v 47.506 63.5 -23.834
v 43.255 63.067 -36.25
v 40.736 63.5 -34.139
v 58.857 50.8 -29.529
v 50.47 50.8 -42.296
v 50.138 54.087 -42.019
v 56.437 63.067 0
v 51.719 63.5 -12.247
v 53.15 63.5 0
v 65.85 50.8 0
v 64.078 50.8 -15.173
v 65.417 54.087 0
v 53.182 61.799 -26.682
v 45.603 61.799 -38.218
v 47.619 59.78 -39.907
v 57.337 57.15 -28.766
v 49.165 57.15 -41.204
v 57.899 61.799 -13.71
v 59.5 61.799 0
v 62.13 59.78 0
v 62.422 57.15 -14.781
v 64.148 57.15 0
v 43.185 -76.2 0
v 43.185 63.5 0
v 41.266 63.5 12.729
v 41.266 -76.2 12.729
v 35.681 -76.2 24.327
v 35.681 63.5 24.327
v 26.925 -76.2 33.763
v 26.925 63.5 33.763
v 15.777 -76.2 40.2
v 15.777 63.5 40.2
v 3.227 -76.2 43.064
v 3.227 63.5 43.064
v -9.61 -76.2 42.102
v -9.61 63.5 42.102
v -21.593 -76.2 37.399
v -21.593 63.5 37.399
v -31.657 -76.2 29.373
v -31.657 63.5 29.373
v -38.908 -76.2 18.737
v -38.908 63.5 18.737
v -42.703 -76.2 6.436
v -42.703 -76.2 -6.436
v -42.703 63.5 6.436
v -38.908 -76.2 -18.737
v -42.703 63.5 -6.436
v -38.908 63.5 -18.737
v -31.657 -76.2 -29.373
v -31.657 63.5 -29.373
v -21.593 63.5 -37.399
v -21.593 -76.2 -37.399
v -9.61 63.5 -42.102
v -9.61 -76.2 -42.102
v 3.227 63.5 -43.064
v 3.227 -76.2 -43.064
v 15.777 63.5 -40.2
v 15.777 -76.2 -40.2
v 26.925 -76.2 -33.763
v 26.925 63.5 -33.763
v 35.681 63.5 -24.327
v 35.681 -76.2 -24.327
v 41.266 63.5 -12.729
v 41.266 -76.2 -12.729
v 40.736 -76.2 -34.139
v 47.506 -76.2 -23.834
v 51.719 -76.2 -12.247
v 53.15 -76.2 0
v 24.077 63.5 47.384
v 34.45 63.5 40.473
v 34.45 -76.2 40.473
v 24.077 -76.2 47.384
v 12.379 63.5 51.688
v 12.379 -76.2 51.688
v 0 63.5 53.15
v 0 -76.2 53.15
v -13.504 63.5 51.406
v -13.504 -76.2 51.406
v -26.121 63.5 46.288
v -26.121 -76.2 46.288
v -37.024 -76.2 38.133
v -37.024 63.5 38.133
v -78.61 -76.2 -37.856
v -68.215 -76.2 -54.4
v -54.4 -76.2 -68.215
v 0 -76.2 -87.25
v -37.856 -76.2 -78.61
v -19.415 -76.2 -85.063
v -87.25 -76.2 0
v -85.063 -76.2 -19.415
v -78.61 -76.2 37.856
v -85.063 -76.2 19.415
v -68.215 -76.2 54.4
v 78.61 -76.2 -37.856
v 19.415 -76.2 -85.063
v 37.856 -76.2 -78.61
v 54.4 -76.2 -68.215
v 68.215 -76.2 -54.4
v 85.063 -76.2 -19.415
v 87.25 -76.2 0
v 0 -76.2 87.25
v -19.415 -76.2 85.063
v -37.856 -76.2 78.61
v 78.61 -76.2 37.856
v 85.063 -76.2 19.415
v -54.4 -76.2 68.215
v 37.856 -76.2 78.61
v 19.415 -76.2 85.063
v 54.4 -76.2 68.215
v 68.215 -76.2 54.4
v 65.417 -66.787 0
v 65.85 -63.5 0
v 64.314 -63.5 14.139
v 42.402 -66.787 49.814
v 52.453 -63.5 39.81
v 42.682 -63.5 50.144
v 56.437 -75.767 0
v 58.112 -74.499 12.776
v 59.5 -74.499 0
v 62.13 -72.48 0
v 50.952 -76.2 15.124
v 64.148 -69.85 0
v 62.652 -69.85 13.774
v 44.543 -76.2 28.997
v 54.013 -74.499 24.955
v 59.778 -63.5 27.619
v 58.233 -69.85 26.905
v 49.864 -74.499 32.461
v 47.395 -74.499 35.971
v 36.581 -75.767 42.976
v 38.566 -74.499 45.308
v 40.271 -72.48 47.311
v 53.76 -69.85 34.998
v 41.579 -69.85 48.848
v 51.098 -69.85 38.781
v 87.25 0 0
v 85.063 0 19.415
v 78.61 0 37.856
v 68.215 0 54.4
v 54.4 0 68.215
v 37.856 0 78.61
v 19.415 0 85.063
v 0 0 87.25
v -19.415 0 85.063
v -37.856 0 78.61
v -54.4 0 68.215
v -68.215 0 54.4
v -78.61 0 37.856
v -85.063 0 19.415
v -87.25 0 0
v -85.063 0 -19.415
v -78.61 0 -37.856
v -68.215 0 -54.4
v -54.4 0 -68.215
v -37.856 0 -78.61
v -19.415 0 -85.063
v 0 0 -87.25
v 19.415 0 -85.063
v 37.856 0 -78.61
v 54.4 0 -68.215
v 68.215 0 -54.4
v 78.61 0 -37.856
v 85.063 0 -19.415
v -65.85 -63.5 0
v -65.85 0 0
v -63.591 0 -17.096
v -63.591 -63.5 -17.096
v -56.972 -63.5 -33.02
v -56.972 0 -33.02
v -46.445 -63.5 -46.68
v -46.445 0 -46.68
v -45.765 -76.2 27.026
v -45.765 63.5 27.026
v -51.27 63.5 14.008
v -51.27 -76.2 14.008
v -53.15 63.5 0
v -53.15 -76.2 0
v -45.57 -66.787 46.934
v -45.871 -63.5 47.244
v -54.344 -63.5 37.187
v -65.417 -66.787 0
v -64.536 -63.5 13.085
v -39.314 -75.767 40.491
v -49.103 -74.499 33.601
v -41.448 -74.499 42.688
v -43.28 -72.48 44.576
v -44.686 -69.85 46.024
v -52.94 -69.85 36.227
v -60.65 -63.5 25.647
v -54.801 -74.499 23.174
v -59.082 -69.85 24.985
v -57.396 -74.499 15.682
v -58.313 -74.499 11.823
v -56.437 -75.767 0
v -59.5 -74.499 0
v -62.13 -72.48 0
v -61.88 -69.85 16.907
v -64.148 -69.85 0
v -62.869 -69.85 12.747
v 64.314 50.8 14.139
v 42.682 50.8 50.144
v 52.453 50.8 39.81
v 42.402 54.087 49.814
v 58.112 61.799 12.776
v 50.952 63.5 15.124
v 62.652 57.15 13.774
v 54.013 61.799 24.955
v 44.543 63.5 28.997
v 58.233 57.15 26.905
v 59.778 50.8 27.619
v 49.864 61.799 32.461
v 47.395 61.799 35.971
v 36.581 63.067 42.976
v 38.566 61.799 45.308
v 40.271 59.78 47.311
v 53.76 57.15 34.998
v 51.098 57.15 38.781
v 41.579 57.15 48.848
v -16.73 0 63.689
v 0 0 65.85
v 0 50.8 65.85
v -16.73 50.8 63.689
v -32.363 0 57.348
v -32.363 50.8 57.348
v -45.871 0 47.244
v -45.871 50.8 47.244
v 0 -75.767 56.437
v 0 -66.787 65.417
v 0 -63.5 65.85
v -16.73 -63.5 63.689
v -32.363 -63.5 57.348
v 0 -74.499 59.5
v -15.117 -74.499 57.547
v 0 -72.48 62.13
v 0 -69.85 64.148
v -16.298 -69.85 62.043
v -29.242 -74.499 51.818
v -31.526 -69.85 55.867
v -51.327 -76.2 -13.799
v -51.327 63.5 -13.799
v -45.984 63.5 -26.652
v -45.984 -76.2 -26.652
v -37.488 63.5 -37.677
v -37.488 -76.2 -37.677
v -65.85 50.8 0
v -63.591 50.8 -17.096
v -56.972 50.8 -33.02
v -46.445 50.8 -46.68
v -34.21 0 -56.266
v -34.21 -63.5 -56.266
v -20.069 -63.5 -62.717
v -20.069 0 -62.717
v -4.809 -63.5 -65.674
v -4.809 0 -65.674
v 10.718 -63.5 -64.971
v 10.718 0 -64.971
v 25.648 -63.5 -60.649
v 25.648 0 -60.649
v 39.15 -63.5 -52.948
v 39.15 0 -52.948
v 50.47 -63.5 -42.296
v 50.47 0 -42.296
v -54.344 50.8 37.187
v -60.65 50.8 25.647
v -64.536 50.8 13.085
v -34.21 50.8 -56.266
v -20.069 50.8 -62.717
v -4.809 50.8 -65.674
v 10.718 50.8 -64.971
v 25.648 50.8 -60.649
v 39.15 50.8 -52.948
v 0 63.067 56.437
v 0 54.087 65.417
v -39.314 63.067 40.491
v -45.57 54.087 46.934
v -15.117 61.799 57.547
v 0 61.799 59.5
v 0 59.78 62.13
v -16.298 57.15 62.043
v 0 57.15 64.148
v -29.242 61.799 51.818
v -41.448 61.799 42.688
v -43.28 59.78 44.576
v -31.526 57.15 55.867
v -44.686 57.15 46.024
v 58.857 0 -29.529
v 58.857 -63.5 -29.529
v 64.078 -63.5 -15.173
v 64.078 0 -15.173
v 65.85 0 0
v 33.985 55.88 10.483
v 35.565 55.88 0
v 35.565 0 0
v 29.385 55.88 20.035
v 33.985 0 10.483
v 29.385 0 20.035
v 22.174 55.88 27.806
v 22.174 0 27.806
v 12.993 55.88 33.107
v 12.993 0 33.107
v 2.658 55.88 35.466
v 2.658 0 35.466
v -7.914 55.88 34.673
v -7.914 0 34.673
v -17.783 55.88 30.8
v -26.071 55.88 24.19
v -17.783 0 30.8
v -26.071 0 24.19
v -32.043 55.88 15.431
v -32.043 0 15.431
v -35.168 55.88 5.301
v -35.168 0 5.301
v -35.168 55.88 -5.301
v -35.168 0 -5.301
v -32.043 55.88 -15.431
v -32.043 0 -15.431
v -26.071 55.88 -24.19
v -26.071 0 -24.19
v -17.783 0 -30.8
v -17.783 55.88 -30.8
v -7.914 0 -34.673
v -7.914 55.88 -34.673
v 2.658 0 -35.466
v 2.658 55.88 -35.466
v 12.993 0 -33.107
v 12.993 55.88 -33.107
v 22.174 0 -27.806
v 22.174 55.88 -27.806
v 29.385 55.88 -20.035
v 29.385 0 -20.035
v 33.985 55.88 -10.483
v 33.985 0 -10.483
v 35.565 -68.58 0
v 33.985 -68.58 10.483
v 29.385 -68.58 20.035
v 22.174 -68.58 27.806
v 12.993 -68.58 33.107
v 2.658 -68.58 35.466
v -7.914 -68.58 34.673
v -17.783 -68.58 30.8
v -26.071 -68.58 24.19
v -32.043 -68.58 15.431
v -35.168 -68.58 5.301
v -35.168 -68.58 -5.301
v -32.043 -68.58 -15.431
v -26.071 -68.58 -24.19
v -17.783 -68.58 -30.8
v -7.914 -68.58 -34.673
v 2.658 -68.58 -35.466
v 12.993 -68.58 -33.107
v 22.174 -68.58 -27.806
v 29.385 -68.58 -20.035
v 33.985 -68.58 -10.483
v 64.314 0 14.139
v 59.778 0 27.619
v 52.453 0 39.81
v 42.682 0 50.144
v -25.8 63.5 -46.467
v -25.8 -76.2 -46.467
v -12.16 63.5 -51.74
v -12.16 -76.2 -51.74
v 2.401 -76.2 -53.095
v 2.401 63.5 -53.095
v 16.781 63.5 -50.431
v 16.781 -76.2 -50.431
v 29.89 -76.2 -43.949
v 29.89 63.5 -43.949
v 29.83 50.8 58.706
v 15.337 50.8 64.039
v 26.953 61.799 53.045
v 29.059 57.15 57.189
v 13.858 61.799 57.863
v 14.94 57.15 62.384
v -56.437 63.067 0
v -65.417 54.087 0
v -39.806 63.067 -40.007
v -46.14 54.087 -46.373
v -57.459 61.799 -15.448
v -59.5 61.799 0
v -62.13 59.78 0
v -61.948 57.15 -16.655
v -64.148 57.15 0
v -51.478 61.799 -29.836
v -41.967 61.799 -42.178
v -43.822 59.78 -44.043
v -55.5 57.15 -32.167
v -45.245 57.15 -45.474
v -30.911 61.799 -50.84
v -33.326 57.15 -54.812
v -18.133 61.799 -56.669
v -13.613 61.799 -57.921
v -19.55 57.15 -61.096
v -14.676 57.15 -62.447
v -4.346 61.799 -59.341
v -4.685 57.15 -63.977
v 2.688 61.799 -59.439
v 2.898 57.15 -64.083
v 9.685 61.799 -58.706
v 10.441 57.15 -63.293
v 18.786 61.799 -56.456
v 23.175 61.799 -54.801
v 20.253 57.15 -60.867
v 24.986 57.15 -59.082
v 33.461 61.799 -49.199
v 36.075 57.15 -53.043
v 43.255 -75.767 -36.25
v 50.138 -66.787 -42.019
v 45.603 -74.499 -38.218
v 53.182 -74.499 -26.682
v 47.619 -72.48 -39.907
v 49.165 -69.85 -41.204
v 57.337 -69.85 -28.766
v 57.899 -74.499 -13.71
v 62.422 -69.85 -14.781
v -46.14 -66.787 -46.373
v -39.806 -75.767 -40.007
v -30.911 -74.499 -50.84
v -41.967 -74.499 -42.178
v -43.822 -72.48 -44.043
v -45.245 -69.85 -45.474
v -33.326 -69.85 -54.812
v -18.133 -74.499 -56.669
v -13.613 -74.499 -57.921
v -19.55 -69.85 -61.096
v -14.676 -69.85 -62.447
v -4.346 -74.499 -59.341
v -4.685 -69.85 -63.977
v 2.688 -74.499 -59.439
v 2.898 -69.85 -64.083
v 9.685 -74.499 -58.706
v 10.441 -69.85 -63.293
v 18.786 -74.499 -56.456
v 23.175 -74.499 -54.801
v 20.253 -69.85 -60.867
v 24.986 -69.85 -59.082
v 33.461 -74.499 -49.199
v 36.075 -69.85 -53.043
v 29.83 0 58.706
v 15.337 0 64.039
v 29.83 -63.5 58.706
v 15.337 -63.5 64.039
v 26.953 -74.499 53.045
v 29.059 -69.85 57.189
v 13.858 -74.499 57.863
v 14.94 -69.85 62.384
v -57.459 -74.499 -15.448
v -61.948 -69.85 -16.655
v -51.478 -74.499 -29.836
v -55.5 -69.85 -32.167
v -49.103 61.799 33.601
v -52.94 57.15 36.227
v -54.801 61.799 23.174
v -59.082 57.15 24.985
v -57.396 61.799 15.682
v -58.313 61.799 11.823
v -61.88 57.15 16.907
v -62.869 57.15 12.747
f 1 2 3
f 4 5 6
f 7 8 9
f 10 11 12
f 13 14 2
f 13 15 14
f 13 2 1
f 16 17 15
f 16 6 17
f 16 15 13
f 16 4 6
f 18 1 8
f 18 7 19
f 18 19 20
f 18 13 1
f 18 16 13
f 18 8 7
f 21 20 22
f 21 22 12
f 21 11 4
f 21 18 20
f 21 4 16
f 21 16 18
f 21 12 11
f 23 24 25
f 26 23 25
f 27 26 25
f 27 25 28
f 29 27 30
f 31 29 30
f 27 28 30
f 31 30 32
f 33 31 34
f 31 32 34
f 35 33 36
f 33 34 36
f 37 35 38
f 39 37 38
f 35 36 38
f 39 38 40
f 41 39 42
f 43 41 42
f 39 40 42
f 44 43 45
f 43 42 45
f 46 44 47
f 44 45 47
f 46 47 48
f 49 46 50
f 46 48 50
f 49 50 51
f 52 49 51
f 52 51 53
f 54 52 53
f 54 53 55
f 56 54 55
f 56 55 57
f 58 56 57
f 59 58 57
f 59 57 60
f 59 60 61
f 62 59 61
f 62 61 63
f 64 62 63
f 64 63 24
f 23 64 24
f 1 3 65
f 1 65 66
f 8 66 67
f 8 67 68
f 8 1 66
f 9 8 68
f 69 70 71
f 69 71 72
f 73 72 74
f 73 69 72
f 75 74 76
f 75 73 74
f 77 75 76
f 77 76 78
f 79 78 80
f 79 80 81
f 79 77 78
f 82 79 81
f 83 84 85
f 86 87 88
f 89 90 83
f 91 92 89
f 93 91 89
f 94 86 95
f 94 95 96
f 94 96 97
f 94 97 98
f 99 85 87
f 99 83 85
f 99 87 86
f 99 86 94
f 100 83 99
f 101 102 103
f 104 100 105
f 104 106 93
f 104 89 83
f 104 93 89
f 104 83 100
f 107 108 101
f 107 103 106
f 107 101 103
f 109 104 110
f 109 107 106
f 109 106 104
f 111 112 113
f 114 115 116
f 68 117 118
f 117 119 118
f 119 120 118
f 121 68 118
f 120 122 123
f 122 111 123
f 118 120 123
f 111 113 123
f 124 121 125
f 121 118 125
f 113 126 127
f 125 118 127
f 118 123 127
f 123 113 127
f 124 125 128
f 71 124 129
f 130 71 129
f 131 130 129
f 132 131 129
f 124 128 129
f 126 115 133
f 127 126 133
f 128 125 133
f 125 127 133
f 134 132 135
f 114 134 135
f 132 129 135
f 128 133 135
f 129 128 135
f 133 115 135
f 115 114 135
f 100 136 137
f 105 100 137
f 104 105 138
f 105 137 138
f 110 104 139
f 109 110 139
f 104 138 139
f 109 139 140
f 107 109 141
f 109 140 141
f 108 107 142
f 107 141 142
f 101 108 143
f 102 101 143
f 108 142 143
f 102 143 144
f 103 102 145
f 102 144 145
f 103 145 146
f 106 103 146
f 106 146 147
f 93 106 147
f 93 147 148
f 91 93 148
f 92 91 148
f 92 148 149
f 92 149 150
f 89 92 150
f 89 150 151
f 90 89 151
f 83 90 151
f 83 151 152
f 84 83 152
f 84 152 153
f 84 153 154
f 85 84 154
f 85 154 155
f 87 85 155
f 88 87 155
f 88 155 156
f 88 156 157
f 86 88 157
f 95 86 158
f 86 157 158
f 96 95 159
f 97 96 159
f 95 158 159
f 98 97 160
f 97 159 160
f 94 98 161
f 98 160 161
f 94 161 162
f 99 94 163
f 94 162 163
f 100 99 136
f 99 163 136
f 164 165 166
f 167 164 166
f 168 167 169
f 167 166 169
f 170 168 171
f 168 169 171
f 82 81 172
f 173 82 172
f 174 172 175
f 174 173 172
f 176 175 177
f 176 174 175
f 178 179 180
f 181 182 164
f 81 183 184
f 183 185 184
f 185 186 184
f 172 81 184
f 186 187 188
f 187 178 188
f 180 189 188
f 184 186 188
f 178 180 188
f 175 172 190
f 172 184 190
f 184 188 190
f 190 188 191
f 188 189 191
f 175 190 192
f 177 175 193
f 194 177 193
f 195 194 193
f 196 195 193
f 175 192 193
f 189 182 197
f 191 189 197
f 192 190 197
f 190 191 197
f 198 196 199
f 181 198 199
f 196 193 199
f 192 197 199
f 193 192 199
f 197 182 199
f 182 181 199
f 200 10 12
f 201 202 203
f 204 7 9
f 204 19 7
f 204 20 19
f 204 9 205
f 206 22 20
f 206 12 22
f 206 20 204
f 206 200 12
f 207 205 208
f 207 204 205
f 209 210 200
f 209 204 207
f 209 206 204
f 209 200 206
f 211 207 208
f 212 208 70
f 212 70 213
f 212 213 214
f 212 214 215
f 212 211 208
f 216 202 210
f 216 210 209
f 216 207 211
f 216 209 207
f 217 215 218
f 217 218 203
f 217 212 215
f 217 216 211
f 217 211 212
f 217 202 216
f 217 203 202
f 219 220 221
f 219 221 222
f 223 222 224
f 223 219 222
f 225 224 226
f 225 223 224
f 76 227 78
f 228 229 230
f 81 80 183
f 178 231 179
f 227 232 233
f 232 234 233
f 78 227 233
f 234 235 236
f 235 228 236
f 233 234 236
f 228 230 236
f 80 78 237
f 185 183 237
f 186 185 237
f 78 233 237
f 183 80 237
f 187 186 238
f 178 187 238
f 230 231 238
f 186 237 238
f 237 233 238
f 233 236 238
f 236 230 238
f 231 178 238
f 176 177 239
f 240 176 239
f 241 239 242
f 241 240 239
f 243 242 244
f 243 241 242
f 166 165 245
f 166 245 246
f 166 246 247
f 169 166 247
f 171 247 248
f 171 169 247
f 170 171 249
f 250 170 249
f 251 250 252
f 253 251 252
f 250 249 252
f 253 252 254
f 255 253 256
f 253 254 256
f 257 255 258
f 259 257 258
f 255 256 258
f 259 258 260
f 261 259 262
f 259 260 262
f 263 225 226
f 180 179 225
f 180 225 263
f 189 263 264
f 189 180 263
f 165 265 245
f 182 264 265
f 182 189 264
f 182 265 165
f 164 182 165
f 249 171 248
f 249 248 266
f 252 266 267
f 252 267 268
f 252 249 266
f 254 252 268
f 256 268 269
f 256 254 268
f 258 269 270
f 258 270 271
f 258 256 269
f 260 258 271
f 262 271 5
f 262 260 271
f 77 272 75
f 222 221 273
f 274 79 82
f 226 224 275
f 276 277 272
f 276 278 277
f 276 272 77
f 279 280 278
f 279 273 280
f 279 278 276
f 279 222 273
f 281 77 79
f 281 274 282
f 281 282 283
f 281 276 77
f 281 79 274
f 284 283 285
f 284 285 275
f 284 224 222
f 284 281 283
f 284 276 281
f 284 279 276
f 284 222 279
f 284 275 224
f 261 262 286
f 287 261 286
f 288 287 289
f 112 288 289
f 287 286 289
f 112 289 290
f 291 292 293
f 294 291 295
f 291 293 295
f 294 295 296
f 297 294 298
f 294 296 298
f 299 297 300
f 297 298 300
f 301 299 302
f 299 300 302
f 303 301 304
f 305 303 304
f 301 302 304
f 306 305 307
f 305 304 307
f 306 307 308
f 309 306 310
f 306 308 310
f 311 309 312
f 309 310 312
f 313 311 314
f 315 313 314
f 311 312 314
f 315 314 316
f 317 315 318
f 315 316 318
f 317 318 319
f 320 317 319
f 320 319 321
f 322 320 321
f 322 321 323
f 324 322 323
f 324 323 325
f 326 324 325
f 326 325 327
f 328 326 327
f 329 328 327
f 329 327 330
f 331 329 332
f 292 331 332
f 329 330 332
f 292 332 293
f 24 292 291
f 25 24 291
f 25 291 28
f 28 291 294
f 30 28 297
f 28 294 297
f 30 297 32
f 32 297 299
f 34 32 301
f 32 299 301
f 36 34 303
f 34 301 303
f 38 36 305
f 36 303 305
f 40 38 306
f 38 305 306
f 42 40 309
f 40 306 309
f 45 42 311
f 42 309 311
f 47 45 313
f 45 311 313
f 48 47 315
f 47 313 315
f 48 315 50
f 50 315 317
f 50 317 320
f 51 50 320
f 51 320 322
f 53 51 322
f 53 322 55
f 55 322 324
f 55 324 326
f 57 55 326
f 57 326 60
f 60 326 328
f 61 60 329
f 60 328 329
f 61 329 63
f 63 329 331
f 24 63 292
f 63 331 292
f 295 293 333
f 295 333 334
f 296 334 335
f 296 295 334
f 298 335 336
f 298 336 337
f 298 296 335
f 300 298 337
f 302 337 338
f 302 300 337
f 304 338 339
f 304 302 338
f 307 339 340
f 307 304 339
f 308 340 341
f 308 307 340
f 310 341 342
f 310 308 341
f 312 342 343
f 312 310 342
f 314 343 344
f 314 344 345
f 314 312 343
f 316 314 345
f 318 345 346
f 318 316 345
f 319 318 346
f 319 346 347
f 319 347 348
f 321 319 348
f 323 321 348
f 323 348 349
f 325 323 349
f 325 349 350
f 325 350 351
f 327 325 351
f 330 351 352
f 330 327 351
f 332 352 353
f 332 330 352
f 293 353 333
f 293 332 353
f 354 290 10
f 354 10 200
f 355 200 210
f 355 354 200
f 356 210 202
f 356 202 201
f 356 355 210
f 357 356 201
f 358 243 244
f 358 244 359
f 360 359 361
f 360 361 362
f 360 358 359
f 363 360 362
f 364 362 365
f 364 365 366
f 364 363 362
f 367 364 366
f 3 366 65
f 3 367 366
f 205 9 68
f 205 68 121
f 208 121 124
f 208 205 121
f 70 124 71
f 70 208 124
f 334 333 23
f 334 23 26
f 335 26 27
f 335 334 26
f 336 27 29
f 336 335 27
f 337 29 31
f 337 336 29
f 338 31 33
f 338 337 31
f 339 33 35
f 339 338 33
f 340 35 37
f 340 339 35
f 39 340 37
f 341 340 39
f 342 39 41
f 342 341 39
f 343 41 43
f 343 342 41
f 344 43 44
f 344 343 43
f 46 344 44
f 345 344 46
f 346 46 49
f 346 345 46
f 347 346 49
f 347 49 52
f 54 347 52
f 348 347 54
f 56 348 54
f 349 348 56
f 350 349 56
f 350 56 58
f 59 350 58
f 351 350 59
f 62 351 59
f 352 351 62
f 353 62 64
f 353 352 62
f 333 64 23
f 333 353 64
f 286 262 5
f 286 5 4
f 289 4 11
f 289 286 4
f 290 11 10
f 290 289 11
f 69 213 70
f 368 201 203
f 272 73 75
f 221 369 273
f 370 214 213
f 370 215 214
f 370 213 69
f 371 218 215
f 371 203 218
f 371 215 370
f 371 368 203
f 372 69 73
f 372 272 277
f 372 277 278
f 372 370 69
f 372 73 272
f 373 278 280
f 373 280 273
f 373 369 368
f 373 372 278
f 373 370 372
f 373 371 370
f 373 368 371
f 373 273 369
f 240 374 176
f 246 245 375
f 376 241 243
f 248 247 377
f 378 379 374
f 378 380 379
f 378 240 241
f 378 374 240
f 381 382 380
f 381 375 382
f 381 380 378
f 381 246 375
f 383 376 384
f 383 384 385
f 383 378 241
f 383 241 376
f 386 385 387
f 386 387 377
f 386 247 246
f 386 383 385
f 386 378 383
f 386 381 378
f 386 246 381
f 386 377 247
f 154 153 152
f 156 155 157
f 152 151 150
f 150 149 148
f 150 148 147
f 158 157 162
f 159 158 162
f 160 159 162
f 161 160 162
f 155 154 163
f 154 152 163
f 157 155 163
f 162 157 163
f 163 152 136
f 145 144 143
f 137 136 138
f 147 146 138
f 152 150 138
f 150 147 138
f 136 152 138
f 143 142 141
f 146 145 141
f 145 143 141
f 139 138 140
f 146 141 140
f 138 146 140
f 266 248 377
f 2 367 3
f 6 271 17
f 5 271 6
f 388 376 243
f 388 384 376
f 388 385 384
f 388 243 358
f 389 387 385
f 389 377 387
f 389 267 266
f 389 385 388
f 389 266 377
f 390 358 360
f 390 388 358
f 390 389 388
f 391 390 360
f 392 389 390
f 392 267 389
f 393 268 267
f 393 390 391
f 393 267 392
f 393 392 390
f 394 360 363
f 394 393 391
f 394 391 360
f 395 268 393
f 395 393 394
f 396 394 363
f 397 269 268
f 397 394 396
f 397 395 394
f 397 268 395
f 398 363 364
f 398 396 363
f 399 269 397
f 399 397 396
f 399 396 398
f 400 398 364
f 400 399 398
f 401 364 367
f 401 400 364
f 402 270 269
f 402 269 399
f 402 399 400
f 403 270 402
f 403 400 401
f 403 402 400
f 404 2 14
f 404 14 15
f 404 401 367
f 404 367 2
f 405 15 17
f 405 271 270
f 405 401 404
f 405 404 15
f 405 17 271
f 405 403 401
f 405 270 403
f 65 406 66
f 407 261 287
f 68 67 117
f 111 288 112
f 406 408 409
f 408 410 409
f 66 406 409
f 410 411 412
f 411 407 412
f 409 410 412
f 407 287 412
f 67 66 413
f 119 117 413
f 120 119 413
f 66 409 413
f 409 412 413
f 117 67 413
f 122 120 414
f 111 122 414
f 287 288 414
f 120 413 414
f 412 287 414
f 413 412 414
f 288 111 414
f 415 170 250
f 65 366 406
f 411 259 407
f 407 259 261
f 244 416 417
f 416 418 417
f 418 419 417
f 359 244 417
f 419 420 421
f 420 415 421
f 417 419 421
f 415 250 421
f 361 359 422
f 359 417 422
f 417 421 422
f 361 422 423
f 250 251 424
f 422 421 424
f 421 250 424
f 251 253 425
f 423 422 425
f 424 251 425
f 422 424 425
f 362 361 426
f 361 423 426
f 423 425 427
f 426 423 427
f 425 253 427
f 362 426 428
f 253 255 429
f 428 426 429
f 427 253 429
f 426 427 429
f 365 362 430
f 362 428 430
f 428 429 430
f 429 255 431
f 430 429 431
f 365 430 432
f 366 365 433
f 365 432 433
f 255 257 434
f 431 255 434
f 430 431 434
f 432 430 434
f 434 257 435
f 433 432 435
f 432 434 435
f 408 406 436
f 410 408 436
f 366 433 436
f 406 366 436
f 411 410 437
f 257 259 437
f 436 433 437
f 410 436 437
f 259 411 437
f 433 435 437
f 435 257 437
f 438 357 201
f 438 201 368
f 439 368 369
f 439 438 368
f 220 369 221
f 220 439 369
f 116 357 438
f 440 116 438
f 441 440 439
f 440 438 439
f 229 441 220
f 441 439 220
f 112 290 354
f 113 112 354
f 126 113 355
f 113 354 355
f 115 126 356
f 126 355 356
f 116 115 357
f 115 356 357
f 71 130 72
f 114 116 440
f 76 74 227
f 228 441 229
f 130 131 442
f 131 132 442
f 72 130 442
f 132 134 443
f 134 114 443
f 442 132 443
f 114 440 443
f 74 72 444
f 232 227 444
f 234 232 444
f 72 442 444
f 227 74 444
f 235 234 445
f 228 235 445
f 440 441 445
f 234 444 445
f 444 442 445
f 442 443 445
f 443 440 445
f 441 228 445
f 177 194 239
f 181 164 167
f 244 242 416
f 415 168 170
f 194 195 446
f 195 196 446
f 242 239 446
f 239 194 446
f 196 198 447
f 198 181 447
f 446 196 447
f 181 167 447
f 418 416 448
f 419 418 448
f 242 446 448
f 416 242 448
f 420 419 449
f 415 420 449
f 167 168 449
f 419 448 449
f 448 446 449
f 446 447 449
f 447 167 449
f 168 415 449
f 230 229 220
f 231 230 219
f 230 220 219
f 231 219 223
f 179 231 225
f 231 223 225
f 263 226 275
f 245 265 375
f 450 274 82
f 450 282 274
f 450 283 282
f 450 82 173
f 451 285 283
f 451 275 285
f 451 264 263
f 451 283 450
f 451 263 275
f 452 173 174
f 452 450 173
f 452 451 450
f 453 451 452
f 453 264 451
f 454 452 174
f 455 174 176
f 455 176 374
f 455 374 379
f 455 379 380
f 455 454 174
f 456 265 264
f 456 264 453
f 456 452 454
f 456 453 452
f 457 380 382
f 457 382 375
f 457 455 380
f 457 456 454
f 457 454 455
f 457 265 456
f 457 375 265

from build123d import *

# Parameters (mm, degrees)
F0_R          = 35.5650763439
F1_DEPTH      = 76.2
F1_DEPTH_BACK = 63.5
F2_R          = 12.7
F3_SIZE       = 7.62
F4_DEPTH      = 177.8
F5_R          = 87.2500629337
F6_DEPTH      = 152.4
F7_DEPTH      = 76.2


# Not quite as in the source:
# - the program builds the solid bodies; features that only make, move or delete a surface that nothing else refers to are left out


with BuildPart() as f1:
    # F0 (on Front) → F1 (new body, two sides)
    with BuildSketch(Plane.XZ) as f1_sk:
        with BuildLine():
            Line((-39.0193847966, 40.3927160345), (-45.8709552438, 47.2442864817))
            ThreePointArc((-45.8709552438, 47.2442864817), (-60.649609484, 25.6474562011), (-65.8495796505, 0))
            Line((-65.8495796505, 0), (-56.161231277, 0))
            ThreePointArc((-56.161231277, 0), (-51.6984554527, 21.9397721581), (-39.0193847966, 40.3927160345))
        make_face()
        with BuildLine():
            Line((0, 56.161231277), (0, 65.8495796505))
            ThreePointArc((0, 65.8495796505), (-24.7502599425, 61.0212403424), (-45.8709552438, 47.2442864817))
            Line((-45.8709552438, 47.2442864817), (-39.0193847966, 40.3927160345))
            ThreePointArc((-39.0193847966, 40.3927160345), (-21.0425667568, 52.0700900982), (0, 56.161231277))
        make_face()
        with BuildLine():
            Line((35.8053838633, 43.2672900116), (42.6820145021, 50.1439206504))
            ThreePointArc((42.6820145021, 50.1439206504), (22.7399543018, 61.7985567671), (0, 65.8495796505))
            Line((0, 65.8495796505), (0, 56.161231277))
            ThreePointArc((0, 56.161231277), (19.0281320349, 52.8395125811), (35.8053838633, 43.2672900116))
        make_face()
        with BuildLine():
            Line((56.161231277, 0), (65.8495796505, 0))
            ThreePointArc((65.8495796505, 0), (59.7777544482, 27.6186026669), (42.6820145021, 50.1439206504))
            Line((42.6820145021, 50.1439206504), (35.8053838633, 43.2672900116))
            ThreePointArc((35.8053838633, 43.2672900116), (50.8180988559, 23.9082564655), (56.161231277, 0))
        make_face()
        with BuildLine():
            ThreePointArc((50.469556702, -42.2964654133), (61.8852415125, -22.5029780938), (65.8495796505, 0))
            Line((65.8495796505, 0), (56.161231277, 0))
            ThreePointArc((56.161231277, 0), (52.9245852031, -18.7902149969), (43.5877113736, -35.4146200849))
            Line((43.5877113736, -35.4146200849), (50.469556702, -42.2964654133))
        make_face()
        with BuildLine():
            ThreePointArc((0, -65.8495796505), (27.8474655219, -59.6714823358), (50.469556702, -42.2964654133))
            Line((50.469556702, -42.2964654133), (43.5877113736, -35.4146200849))
            ThreePointArc((43.5877113736, -35.4146200849), (24.1366446443, -50.7100215328), (0, -56.161231277))
            Line((0, -56.161231277), (0, -65.8495796505))
        make_face()
        with BuildLine():
            ThreePointArc((-46.445321126, -46.6797524163), (-25.1229483276, -60.8687490218), (0, -65.8495796505))
            Line((0, -65.8495796505), (0, -56.161231277))
            ThreePointArc((0, -56.161231277), (-21.4153744517, -51.9178739514), (-39.5945988408, -39.8290301311))
            Line((-39.5945988408, -39.8290301311), (-46.445321126, -46.6797524163))
        make_face()
        with BuildLine():
            ThreePointArc((-65.8495796505, 0), (-60.8053123215, -25.2760980698), (-46.445321126, -46.6797524163))
            Line((-46.445321126, -46.6797524163), (-39.5945988408, -39.8290301311))
            ThreePointArc((-39.5945988408, -39.8290301311), (-51.8544372323, -21.5685242394), (-56.161231277, 0))
            Line((-56.161231277, 0), (-65.8495796505, 0))
        make_face()
        with BuildLine():
            ThreePointArc((43.5877113736, -35.4146200849), (52.9245852031, -18.7902149969), (56.161231277, 0))
            ThreePointArc((56.161231277, 0), (50.8180988559, 23.9082564655), (35.8053838633, 43.2672900116))
            ThreePointArc((35.8053838633, 43.2672900116), (19.0281320349, 52.8395125811), (0, 56.161231277))
            ThreePointArc((0, 56.161231277), (-21.0425667568, 52.0700900982), (-39.0193847966, 40.3927160345))
            ThreePointArc((-39.0193847966, 40.3927160345), (-51.6984554527, 21.9397721581), (-56.161231277, 0))
            ThreePointArc((-56.161231277, 0), (-51.8544372323, -21.5685242394), (-39.5945988408, -39.8290301311))
            ThreePointArc((-39.5945988408, -39.8290301311), (-21.4153744517, -51.9178739514), (0, -56.161231277))
            ThreePointArc((0, -56.161231277), (24.1366446443, -50.7100215328), (43.5877113736, -35.4146200849))
        make_face()
        Circle(F0_R, mode=Mode.SUBTRACT)
    extrude(amount=F1_DEPTH)
    extrude(f1_sk.sketch, amount=-F1_DEPTH_BACK)

    # F2
    f2_edges = [f1.edges().sort_by_distance(p)[0] for p in [
        (65.84958, -76.2, 0),
        (65.84958, 63.5, 0),
    ]]
    fillet(f2_edges, radius=F2_R)

    # F3
    f3_edges = [f1.edges().sort_by_distance(p)[0] for p in [
        (-35.565076, -76.2, 0),
        (-35.565076, 63.5, 0),
    ]]
    chamfer(f3_edges, length=F3_SIZE)

    # F4 (cut): a face of the model
    f4_faces = [f1.faces().sort_by_distance(p)[0] for p in [
        (-44.6883734714, 63.5, 0),
    ]]
    extrude(f4_faces, amount=-F4_DEPTH, mode=Mode.SUBTRACT)


with BuildPart() as f6:
    # F5 (on Front) → F6 (new body)
    with BuildSketch(Plane.XZ):
        Circle(F5_R)
    extrude(amount=F6_DEPTH)

    # F7 (cut): a face of the model
    f7_faces = [f6.faces().sort_by_distance(p)[0] for p in [
        (0, -152.4, 0),
    ]]
    extrude(f7_faces, amount=-F7_DEPTH, mode=Mode.SUBTRACT)


solid = Compound([f1.part, f6.part])
